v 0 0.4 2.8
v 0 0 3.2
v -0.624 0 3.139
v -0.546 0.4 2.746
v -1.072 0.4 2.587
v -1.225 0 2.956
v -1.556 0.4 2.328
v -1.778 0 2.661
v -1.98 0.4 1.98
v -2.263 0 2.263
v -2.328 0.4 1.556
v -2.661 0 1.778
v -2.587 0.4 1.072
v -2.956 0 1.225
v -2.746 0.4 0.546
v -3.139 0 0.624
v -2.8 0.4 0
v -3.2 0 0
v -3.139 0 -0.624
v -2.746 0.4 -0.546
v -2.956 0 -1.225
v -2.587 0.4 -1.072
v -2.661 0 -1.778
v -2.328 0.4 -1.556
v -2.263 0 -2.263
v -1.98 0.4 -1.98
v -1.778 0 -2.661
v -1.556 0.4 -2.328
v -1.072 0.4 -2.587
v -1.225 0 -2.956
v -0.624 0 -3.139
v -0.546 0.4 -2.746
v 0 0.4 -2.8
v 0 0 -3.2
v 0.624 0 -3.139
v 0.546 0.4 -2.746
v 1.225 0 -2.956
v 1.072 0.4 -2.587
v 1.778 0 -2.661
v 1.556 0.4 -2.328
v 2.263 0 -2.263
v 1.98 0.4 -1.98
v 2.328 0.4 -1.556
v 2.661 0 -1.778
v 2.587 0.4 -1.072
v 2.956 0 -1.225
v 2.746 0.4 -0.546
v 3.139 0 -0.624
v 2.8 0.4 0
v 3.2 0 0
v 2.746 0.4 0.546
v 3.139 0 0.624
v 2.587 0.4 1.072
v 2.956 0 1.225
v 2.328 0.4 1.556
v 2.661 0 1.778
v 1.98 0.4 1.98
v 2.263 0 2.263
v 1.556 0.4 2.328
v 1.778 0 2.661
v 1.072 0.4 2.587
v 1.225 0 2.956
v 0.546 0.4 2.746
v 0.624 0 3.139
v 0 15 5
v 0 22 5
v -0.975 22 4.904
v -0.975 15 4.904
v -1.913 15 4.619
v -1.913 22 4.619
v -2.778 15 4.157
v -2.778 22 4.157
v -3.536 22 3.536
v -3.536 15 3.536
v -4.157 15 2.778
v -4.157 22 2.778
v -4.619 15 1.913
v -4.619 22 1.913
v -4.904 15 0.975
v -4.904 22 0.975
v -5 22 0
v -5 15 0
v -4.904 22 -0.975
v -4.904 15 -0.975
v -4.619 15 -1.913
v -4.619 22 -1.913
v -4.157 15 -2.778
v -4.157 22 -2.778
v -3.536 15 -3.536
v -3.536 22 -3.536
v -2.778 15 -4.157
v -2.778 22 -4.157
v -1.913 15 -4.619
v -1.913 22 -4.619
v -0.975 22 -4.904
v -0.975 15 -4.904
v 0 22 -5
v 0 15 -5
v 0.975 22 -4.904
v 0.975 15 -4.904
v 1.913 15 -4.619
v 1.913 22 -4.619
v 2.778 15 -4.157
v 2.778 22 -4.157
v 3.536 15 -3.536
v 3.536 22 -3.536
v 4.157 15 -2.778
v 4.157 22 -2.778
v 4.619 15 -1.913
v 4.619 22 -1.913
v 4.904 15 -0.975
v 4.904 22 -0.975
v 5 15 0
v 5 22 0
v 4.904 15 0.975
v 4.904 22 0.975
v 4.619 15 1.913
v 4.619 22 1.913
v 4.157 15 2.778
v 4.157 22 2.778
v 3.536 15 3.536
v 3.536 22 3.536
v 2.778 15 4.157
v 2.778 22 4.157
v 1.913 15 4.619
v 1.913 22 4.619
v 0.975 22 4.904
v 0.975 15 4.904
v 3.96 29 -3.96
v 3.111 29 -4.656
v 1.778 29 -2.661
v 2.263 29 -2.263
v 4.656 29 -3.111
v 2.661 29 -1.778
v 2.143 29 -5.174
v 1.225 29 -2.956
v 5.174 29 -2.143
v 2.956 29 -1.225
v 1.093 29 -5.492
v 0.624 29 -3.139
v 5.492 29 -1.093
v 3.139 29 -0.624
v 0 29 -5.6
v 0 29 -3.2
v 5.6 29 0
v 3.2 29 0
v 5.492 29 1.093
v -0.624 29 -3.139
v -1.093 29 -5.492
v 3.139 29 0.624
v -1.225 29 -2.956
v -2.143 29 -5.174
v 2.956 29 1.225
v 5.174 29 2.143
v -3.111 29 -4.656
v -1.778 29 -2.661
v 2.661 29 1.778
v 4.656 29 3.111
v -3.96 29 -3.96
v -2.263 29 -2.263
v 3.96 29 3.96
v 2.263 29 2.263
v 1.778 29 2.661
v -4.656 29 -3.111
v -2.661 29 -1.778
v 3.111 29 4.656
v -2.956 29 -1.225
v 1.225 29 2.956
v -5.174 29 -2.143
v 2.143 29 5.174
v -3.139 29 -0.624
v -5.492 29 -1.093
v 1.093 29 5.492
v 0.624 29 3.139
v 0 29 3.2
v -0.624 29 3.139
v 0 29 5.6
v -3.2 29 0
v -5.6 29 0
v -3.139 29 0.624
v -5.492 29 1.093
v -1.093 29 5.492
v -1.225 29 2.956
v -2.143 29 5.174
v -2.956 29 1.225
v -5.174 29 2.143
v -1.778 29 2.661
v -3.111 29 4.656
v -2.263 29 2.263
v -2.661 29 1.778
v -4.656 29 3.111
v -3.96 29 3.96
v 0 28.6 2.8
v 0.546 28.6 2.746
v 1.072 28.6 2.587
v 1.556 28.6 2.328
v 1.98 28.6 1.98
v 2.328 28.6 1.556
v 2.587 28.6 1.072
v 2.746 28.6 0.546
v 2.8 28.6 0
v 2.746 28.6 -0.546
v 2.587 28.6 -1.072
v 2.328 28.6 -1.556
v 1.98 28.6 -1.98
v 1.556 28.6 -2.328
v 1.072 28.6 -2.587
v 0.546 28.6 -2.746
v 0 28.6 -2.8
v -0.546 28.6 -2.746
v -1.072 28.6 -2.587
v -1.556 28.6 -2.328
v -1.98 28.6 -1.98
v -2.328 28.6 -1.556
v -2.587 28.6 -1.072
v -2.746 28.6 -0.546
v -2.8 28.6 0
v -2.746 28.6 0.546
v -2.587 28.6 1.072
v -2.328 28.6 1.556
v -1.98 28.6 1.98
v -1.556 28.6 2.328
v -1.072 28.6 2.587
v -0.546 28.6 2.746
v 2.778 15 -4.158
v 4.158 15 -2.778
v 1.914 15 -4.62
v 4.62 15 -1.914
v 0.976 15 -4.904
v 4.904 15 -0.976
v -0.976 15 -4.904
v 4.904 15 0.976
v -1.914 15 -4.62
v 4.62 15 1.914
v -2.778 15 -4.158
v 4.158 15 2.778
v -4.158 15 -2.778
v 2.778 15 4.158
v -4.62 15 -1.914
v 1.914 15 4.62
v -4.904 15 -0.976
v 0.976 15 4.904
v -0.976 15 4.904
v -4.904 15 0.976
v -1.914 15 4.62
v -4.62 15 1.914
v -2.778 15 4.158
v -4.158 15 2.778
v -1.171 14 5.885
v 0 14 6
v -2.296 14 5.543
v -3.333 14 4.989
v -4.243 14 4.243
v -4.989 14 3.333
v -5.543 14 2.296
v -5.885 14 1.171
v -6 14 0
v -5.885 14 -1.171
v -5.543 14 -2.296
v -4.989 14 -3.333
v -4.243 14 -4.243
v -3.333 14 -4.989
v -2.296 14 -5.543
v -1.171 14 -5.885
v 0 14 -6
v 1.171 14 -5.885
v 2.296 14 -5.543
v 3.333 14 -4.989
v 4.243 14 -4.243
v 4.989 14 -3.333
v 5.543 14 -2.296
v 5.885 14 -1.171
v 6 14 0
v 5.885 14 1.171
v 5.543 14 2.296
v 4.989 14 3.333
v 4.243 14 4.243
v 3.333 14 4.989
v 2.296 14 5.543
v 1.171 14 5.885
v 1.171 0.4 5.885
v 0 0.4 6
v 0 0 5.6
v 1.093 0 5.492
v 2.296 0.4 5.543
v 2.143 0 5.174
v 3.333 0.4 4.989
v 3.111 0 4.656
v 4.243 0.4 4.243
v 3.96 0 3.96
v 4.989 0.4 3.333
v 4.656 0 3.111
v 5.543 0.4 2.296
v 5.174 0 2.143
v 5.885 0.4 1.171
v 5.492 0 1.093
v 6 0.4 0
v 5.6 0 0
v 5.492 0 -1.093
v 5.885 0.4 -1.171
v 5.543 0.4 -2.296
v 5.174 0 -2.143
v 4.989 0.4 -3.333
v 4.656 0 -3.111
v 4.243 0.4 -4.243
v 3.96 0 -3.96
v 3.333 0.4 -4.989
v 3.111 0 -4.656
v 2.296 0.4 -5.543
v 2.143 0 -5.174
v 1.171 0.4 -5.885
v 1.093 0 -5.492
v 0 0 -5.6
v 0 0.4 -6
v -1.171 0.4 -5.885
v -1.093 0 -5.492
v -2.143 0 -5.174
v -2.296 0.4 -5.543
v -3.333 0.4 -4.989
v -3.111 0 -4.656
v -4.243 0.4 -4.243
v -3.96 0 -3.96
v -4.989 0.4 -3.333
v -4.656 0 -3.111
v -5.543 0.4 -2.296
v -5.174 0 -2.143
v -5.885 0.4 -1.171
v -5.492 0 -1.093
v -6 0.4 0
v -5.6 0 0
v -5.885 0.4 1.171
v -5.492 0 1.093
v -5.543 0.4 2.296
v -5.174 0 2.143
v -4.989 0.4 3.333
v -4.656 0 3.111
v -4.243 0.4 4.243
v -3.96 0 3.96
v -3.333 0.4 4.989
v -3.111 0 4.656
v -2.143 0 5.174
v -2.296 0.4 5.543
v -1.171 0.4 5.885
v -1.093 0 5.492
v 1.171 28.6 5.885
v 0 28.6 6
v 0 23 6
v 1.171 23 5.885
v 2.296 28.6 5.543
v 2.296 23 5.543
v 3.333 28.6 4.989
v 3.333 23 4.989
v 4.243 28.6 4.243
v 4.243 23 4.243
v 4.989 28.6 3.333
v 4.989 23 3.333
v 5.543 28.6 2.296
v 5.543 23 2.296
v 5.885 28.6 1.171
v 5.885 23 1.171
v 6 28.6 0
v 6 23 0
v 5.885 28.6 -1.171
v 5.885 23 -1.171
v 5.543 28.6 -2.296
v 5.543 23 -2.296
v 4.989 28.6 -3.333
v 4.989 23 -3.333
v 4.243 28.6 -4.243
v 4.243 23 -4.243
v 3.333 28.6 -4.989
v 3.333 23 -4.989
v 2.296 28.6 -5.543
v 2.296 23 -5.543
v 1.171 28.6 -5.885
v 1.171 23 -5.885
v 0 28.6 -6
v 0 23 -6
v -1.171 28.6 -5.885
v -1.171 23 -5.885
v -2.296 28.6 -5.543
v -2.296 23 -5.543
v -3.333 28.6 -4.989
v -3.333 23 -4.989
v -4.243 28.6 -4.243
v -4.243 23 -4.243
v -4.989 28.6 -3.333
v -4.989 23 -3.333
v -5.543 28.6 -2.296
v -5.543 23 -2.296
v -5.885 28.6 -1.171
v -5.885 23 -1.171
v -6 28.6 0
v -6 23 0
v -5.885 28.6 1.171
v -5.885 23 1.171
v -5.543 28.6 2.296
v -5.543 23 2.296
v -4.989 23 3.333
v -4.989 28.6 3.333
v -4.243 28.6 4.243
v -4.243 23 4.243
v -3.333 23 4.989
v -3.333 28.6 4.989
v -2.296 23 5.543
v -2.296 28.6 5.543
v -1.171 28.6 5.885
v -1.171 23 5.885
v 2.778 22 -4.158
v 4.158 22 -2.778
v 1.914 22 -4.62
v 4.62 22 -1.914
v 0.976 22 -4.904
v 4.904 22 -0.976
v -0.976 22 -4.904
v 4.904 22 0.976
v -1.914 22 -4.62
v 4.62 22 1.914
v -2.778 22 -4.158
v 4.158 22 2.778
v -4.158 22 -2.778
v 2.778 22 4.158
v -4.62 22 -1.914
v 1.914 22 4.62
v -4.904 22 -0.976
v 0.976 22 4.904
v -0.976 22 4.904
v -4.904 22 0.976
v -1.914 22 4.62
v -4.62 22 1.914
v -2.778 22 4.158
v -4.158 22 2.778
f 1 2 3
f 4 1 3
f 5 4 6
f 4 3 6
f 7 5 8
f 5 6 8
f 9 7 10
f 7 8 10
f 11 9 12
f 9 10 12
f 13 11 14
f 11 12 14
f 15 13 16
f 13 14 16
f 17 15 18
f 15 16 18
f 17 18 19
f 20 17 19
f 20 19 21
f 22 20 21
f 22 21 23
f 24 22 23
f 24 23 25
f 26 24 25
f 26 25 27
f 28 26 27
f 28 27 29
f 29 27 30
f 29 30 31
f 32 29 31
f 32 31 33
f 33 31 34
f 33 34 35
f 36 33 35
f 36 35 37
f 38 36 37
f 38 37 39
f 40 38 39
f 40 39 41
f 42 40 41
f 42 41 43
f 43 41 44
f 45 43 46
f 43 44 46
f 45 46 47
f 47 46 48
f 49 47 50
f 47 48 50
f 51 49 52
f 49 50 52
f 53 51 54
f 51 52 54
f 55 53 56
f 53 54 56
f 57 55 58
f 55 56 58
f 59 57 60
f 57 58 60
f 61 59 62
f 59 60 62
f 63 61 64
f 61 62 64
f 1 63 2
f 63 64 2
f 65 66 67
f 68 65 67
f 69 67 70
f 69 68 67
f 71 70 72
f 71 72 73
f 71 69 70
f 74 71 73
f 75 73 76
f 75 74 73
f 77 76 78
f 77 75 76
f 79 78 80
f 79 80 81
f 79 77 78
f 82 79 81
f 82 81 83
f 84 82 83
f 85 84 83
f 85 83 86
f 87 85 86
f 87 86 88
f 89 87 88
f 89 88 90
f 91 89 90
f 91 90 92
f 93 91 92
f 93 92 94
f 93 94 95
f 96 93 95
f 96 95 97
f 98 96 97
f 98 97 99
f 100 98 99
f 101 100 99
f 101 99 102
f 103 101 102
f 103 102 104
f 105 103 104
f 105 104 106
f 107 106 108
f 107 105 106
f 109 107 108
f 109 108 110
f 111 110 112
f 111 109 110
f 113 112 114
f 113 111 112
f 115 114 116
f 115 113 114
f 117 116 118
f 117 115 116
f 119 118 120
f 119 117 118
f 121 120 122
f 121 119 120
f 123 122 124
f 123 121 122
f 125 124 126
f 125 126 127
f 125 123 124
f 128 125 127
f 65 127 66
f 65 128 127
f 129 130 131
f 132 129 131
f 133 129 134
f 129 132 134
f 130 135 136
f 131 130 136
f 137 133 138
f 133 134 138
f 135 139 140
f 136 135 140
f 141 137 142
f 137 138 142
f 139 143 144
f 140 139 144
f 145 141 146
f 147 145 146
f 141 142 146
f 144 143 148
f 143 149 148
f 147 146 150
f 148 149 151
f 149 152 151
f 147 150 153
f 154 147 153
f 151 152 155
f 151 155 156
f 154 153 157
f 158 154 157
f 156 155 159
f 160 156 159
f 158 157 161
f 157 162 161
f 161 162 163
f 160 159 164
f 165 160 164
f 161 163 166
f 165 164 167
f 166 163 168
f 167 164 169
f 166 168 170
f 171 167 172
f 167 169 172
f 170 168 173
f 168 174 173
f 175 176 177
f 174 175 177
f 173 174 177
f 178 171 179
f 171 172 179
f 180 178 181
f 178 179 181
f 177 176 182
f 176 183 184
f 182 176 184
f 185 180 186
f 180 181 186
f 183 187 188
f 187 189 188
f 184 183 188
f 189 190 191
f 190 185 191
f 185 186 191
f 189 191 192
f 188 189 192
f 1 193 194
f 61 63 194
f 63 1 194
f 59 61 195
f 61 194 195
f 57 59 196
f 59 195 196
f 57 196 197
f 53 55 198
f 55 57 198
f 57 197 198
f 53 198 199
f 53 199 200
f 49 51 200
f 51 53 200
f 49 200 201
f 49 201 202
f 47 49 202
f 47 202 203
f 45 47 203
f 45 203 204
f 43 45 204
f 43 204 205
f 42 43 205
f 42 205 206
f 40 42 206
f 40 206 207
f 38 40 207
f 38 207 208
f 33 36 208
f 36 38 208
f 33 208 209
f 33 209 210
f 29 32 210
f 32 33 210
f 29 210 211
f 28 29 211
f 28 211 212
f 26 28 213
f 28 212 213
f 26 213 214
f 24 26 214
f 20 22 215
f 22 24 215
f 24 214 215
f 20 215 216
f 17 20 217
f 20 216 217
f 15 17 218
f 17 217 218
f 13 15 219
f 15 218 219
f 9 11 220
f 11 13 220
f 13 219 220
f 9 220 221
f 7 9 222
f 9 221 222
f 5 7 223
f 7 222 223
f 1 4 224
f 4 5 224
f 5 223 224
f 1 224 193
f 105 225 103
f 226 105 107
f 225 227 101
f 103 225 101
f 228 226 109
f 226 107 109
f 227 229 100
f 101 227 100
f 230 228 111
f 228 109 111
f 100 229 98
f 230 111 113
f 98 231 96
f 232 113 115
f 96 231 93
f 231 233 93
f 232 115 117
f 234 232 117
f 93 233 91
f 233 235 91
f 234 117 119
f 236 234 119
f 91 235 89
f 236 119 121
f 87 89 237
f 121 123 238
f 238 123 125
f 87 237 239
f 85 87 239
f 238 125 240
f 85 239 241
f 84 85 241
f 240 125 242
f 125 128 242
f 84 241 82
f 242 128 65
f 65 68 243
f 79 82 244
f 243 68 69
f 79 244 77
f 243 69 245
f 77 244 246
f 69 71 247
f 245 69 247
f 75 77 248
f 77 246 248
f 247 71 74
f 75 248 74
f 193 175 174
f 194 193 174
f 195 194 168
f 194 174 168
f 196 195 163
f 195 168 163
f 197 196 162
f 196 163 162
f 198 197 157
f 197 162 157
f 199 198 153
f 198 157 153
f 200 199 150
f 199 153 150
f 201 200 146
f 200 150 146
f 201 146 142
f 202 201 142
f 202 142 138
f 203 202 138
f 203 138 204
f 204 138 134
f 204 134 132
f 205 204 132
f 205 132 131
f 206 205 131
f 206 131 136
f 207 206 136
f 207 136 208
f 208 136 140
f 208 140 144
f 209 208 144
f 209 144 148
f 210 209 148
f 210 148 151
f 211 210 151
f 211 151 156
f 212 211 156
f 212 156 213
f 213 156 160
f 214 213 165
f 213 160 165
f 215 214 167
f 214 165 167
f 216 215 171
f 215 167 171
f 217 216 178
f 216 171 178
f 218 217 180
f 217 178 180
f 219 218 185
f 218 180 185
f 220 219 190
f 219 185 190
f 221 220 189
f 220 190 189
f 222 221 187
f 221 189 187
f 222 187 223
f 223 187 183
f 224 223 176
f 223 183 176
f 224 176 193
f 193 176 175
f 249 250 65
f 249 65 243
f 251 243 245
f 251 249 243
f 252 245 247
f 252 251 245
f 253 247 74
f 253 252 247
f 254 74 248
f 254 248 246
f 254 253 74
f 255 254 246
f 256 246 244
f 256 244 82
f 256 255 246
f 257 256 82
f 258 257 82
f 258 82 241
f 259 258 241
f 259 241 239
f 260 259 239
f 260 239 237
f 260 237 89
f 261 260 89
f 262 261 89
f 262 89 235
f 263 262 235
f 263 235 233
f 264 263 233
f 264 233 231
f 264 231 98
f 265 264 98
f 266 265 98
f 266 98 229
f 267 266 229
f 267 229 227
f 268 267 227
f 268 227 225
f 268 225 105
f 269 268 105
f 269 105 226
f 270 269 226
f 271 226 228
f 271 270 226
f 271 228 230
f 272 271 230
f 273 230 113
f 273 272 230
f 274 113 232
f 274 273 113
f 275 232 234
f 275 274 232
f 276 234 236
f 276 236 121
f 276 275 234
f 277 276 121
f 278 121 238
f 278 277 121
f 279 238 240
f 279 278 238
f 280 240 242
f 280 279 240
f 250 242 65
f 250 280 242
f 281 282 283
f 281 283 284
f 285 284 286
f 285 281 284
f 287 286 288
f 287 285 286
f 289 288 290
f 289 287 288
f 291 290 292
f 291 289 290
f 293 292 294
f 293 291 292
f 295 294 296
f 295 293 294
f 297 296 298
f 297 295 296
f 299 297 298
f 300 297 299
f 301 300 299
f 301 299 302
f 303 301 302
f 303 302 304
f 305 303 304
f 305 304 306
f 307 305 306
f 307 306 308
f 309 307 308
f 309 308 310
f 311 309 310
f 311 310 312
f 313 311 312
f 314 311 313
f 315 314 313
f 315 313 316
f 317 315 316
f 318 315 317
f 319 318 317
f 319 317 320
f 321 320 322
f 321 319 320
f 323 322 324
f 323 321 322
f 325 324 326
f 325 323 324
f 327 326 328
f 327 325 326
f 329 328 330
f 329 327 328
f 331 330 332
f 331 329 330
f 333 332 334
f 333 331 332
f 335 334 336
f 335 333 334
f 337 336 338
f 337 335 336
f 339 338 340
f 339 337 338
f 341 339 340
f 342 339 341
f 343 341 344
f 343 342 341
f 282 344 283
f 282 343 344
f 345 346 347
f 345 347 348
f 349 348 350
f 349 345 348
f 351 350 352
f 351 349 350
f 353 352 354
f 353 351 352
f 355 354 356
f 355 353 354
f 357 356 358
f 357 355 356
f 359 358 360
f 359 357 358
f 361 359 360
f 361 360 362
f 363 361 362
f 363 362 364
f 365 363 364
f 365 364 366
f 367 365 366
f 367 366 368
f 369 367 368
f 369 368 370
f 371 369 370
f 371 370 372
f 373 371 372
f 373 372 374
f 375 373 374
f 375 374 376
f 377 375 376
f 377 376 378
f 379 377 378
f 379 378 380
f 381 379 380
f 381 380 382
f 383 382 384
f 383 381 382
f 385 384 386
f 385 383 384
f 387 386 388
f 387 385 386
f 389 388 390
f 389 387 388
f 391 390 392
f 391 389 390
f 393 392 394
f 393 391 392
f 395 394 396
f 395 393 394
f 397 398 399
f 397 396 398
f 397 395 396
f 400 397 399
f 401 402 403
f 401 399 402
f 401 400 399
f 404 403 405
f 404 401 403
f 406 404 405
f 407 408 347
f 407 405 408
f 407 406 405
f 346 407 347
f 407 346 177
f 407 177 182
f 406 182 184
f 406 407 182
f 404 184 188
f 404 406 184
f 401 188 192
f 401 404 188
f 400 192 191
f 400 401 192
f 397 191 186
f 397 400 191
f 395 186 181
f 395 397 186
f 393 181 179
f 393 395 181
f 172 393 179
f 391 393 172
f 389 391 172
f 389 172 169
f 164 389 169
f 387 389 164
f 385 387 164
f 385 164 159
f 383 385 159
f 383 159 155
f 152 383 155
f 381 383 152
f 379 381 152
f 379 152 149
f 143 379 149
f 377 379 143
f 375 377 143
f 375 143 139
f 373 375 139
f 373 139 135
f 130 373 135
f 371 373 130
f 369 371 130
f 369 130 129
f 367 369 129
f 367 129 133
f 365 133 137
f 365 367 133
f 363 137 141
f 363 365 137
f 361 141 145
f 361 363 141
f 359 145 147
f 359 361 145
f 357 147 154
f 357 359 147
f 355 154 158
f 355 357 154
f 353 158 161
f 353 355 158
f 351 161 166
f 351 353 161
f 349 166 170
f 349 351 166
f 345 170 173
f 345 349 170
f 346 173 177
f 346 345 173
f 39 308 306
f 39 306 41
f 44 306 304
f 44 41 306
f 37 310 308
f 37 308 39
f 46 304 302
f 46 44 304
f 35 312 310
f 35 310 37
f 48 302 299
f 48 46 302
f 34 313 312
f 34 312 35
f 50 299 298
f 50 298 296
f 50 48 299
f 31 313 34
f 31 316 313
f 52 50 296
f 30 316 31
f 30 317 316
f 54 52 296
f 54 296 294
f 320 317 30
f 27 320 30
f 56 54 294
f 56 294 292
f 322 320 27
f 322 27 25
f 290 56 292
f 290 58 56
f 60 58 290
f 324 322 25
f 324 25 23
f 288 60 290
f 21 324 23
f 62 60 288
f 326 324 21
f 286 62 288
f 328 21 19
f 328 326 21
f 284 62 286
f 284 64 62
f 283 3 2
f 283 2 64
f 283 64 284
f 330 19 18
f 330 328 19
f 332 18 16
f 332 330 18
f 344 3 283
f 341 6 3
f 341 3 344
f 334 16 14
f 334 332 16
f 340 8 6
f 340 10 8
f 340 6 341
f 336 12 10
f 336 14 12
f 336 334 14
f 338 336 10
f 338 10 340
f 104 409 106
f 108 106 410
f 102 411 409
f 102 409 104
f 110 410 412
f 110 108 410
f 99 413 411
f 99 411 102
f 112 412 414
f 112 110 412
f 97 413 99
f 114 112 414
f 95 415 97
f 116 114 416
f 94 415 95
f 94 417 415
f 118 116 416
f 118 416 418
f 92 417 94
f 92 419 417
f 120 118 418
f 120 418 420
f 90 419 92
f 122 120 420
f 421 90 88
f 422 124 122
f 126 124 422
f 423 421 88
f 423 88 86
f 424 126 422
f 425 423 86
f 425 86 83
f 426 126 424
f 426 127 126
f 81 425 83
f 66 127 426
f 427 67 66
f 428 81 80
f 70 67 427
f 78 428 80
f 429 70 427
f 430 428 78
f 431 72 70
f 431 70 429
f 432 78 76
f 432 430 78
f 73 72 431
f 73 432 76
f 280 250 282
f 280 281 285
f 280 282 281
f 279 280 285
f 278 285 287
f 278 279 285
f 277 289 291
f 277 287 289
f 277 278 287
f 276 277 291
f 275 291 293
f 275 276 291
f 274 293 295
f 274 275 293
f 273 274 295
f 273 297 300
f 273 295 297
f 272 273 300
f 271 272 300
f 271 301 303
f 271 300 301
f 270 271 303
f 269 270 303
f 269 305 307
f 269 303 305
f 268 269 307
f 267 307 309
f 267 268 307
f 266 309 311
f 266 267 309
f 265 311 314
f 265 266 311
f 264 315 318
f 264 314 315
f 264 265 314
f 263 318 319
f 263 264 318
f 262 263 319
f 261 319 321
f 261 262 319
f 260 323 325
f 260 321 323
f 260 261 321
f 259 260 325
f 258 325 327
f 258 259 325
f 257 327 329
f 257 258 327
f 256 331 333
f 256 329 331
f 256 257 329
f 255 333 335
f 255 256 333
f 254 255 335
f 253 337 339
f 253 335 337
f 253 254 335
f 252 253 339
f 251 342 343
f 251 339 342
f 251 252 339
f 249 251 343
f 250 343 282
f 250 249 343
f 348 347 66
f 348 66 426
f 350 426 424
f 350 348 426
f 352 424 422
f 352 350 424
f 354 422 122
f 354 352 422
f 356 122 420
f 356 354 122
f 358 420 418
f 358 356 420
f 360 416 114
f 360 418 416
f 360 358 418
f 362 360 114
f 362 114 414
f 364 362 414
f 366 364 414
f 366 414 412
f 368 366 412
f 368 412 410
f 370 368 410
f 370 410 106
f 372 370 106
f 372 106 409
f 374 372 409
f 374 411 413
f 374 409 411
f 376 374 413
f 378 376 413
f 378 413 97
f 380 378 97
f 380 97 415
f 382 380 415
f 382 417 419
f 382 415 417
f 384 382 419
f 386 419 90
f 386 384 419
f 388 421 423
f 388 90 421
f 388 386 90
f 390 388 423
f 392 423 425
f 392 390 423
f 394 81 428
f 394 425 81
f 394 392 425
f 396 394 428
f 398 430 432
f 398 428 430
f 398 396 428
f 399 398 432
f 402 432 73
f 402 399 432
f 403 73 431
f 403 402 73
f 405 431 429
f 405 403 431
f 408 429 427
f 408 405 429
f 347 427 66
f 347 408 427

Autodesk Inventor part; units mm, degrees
ref_plane "YZ Plane" through (0, 0, 0) normal (1, 0, 0) x (0, 1, 0)
ref_plane "XZ Plane" through (0, 0, 0) normal (0, 1, 0) x (-1, 0, 0)
ref_plane "XY Plane" through (0, 0, 0) normal (0, 0, 1) x (1, 0, 0)
sketch "Эскиз1" plane through (0, 0, 0) normal (1, 0, 0) x (0, 1, 0)
  line L0 (0, 2.8) -> (29, 2.8)
  line L1 (0, 6) -> (15, 6)
  line L2 (15, 6) -> (15, 5)
  line L3 (22, 5) -> (22, 6)
  line L4 (22, 6) -> (29, 6)
  line L5 (29, 6) -> (29, 2.8)
  line L6 (22, 5) -> (15, 5)
  line L7 (0, 6) -> (0, 2.8)
  line L8 (32.1482, 0) -> (-3.0834, 0)
  point P0 (0, 0)
revolve "Вращение1" add sketch "Эскиз1" angle 360 about axis through (0, 32.1482, 0) along (0, -1, 0)
chamfer "Фаска1" distance 1 angle 45 2 edges at (0, 15, -6) (0, 22, -6)
chamfer "Фаска2" distance 0.4 angle 45 4 edges at (0, 29, -2.8) (0, 29, -6) (0, 0, -6) (0, 0, -2.8)
properties part number "prostavka"
